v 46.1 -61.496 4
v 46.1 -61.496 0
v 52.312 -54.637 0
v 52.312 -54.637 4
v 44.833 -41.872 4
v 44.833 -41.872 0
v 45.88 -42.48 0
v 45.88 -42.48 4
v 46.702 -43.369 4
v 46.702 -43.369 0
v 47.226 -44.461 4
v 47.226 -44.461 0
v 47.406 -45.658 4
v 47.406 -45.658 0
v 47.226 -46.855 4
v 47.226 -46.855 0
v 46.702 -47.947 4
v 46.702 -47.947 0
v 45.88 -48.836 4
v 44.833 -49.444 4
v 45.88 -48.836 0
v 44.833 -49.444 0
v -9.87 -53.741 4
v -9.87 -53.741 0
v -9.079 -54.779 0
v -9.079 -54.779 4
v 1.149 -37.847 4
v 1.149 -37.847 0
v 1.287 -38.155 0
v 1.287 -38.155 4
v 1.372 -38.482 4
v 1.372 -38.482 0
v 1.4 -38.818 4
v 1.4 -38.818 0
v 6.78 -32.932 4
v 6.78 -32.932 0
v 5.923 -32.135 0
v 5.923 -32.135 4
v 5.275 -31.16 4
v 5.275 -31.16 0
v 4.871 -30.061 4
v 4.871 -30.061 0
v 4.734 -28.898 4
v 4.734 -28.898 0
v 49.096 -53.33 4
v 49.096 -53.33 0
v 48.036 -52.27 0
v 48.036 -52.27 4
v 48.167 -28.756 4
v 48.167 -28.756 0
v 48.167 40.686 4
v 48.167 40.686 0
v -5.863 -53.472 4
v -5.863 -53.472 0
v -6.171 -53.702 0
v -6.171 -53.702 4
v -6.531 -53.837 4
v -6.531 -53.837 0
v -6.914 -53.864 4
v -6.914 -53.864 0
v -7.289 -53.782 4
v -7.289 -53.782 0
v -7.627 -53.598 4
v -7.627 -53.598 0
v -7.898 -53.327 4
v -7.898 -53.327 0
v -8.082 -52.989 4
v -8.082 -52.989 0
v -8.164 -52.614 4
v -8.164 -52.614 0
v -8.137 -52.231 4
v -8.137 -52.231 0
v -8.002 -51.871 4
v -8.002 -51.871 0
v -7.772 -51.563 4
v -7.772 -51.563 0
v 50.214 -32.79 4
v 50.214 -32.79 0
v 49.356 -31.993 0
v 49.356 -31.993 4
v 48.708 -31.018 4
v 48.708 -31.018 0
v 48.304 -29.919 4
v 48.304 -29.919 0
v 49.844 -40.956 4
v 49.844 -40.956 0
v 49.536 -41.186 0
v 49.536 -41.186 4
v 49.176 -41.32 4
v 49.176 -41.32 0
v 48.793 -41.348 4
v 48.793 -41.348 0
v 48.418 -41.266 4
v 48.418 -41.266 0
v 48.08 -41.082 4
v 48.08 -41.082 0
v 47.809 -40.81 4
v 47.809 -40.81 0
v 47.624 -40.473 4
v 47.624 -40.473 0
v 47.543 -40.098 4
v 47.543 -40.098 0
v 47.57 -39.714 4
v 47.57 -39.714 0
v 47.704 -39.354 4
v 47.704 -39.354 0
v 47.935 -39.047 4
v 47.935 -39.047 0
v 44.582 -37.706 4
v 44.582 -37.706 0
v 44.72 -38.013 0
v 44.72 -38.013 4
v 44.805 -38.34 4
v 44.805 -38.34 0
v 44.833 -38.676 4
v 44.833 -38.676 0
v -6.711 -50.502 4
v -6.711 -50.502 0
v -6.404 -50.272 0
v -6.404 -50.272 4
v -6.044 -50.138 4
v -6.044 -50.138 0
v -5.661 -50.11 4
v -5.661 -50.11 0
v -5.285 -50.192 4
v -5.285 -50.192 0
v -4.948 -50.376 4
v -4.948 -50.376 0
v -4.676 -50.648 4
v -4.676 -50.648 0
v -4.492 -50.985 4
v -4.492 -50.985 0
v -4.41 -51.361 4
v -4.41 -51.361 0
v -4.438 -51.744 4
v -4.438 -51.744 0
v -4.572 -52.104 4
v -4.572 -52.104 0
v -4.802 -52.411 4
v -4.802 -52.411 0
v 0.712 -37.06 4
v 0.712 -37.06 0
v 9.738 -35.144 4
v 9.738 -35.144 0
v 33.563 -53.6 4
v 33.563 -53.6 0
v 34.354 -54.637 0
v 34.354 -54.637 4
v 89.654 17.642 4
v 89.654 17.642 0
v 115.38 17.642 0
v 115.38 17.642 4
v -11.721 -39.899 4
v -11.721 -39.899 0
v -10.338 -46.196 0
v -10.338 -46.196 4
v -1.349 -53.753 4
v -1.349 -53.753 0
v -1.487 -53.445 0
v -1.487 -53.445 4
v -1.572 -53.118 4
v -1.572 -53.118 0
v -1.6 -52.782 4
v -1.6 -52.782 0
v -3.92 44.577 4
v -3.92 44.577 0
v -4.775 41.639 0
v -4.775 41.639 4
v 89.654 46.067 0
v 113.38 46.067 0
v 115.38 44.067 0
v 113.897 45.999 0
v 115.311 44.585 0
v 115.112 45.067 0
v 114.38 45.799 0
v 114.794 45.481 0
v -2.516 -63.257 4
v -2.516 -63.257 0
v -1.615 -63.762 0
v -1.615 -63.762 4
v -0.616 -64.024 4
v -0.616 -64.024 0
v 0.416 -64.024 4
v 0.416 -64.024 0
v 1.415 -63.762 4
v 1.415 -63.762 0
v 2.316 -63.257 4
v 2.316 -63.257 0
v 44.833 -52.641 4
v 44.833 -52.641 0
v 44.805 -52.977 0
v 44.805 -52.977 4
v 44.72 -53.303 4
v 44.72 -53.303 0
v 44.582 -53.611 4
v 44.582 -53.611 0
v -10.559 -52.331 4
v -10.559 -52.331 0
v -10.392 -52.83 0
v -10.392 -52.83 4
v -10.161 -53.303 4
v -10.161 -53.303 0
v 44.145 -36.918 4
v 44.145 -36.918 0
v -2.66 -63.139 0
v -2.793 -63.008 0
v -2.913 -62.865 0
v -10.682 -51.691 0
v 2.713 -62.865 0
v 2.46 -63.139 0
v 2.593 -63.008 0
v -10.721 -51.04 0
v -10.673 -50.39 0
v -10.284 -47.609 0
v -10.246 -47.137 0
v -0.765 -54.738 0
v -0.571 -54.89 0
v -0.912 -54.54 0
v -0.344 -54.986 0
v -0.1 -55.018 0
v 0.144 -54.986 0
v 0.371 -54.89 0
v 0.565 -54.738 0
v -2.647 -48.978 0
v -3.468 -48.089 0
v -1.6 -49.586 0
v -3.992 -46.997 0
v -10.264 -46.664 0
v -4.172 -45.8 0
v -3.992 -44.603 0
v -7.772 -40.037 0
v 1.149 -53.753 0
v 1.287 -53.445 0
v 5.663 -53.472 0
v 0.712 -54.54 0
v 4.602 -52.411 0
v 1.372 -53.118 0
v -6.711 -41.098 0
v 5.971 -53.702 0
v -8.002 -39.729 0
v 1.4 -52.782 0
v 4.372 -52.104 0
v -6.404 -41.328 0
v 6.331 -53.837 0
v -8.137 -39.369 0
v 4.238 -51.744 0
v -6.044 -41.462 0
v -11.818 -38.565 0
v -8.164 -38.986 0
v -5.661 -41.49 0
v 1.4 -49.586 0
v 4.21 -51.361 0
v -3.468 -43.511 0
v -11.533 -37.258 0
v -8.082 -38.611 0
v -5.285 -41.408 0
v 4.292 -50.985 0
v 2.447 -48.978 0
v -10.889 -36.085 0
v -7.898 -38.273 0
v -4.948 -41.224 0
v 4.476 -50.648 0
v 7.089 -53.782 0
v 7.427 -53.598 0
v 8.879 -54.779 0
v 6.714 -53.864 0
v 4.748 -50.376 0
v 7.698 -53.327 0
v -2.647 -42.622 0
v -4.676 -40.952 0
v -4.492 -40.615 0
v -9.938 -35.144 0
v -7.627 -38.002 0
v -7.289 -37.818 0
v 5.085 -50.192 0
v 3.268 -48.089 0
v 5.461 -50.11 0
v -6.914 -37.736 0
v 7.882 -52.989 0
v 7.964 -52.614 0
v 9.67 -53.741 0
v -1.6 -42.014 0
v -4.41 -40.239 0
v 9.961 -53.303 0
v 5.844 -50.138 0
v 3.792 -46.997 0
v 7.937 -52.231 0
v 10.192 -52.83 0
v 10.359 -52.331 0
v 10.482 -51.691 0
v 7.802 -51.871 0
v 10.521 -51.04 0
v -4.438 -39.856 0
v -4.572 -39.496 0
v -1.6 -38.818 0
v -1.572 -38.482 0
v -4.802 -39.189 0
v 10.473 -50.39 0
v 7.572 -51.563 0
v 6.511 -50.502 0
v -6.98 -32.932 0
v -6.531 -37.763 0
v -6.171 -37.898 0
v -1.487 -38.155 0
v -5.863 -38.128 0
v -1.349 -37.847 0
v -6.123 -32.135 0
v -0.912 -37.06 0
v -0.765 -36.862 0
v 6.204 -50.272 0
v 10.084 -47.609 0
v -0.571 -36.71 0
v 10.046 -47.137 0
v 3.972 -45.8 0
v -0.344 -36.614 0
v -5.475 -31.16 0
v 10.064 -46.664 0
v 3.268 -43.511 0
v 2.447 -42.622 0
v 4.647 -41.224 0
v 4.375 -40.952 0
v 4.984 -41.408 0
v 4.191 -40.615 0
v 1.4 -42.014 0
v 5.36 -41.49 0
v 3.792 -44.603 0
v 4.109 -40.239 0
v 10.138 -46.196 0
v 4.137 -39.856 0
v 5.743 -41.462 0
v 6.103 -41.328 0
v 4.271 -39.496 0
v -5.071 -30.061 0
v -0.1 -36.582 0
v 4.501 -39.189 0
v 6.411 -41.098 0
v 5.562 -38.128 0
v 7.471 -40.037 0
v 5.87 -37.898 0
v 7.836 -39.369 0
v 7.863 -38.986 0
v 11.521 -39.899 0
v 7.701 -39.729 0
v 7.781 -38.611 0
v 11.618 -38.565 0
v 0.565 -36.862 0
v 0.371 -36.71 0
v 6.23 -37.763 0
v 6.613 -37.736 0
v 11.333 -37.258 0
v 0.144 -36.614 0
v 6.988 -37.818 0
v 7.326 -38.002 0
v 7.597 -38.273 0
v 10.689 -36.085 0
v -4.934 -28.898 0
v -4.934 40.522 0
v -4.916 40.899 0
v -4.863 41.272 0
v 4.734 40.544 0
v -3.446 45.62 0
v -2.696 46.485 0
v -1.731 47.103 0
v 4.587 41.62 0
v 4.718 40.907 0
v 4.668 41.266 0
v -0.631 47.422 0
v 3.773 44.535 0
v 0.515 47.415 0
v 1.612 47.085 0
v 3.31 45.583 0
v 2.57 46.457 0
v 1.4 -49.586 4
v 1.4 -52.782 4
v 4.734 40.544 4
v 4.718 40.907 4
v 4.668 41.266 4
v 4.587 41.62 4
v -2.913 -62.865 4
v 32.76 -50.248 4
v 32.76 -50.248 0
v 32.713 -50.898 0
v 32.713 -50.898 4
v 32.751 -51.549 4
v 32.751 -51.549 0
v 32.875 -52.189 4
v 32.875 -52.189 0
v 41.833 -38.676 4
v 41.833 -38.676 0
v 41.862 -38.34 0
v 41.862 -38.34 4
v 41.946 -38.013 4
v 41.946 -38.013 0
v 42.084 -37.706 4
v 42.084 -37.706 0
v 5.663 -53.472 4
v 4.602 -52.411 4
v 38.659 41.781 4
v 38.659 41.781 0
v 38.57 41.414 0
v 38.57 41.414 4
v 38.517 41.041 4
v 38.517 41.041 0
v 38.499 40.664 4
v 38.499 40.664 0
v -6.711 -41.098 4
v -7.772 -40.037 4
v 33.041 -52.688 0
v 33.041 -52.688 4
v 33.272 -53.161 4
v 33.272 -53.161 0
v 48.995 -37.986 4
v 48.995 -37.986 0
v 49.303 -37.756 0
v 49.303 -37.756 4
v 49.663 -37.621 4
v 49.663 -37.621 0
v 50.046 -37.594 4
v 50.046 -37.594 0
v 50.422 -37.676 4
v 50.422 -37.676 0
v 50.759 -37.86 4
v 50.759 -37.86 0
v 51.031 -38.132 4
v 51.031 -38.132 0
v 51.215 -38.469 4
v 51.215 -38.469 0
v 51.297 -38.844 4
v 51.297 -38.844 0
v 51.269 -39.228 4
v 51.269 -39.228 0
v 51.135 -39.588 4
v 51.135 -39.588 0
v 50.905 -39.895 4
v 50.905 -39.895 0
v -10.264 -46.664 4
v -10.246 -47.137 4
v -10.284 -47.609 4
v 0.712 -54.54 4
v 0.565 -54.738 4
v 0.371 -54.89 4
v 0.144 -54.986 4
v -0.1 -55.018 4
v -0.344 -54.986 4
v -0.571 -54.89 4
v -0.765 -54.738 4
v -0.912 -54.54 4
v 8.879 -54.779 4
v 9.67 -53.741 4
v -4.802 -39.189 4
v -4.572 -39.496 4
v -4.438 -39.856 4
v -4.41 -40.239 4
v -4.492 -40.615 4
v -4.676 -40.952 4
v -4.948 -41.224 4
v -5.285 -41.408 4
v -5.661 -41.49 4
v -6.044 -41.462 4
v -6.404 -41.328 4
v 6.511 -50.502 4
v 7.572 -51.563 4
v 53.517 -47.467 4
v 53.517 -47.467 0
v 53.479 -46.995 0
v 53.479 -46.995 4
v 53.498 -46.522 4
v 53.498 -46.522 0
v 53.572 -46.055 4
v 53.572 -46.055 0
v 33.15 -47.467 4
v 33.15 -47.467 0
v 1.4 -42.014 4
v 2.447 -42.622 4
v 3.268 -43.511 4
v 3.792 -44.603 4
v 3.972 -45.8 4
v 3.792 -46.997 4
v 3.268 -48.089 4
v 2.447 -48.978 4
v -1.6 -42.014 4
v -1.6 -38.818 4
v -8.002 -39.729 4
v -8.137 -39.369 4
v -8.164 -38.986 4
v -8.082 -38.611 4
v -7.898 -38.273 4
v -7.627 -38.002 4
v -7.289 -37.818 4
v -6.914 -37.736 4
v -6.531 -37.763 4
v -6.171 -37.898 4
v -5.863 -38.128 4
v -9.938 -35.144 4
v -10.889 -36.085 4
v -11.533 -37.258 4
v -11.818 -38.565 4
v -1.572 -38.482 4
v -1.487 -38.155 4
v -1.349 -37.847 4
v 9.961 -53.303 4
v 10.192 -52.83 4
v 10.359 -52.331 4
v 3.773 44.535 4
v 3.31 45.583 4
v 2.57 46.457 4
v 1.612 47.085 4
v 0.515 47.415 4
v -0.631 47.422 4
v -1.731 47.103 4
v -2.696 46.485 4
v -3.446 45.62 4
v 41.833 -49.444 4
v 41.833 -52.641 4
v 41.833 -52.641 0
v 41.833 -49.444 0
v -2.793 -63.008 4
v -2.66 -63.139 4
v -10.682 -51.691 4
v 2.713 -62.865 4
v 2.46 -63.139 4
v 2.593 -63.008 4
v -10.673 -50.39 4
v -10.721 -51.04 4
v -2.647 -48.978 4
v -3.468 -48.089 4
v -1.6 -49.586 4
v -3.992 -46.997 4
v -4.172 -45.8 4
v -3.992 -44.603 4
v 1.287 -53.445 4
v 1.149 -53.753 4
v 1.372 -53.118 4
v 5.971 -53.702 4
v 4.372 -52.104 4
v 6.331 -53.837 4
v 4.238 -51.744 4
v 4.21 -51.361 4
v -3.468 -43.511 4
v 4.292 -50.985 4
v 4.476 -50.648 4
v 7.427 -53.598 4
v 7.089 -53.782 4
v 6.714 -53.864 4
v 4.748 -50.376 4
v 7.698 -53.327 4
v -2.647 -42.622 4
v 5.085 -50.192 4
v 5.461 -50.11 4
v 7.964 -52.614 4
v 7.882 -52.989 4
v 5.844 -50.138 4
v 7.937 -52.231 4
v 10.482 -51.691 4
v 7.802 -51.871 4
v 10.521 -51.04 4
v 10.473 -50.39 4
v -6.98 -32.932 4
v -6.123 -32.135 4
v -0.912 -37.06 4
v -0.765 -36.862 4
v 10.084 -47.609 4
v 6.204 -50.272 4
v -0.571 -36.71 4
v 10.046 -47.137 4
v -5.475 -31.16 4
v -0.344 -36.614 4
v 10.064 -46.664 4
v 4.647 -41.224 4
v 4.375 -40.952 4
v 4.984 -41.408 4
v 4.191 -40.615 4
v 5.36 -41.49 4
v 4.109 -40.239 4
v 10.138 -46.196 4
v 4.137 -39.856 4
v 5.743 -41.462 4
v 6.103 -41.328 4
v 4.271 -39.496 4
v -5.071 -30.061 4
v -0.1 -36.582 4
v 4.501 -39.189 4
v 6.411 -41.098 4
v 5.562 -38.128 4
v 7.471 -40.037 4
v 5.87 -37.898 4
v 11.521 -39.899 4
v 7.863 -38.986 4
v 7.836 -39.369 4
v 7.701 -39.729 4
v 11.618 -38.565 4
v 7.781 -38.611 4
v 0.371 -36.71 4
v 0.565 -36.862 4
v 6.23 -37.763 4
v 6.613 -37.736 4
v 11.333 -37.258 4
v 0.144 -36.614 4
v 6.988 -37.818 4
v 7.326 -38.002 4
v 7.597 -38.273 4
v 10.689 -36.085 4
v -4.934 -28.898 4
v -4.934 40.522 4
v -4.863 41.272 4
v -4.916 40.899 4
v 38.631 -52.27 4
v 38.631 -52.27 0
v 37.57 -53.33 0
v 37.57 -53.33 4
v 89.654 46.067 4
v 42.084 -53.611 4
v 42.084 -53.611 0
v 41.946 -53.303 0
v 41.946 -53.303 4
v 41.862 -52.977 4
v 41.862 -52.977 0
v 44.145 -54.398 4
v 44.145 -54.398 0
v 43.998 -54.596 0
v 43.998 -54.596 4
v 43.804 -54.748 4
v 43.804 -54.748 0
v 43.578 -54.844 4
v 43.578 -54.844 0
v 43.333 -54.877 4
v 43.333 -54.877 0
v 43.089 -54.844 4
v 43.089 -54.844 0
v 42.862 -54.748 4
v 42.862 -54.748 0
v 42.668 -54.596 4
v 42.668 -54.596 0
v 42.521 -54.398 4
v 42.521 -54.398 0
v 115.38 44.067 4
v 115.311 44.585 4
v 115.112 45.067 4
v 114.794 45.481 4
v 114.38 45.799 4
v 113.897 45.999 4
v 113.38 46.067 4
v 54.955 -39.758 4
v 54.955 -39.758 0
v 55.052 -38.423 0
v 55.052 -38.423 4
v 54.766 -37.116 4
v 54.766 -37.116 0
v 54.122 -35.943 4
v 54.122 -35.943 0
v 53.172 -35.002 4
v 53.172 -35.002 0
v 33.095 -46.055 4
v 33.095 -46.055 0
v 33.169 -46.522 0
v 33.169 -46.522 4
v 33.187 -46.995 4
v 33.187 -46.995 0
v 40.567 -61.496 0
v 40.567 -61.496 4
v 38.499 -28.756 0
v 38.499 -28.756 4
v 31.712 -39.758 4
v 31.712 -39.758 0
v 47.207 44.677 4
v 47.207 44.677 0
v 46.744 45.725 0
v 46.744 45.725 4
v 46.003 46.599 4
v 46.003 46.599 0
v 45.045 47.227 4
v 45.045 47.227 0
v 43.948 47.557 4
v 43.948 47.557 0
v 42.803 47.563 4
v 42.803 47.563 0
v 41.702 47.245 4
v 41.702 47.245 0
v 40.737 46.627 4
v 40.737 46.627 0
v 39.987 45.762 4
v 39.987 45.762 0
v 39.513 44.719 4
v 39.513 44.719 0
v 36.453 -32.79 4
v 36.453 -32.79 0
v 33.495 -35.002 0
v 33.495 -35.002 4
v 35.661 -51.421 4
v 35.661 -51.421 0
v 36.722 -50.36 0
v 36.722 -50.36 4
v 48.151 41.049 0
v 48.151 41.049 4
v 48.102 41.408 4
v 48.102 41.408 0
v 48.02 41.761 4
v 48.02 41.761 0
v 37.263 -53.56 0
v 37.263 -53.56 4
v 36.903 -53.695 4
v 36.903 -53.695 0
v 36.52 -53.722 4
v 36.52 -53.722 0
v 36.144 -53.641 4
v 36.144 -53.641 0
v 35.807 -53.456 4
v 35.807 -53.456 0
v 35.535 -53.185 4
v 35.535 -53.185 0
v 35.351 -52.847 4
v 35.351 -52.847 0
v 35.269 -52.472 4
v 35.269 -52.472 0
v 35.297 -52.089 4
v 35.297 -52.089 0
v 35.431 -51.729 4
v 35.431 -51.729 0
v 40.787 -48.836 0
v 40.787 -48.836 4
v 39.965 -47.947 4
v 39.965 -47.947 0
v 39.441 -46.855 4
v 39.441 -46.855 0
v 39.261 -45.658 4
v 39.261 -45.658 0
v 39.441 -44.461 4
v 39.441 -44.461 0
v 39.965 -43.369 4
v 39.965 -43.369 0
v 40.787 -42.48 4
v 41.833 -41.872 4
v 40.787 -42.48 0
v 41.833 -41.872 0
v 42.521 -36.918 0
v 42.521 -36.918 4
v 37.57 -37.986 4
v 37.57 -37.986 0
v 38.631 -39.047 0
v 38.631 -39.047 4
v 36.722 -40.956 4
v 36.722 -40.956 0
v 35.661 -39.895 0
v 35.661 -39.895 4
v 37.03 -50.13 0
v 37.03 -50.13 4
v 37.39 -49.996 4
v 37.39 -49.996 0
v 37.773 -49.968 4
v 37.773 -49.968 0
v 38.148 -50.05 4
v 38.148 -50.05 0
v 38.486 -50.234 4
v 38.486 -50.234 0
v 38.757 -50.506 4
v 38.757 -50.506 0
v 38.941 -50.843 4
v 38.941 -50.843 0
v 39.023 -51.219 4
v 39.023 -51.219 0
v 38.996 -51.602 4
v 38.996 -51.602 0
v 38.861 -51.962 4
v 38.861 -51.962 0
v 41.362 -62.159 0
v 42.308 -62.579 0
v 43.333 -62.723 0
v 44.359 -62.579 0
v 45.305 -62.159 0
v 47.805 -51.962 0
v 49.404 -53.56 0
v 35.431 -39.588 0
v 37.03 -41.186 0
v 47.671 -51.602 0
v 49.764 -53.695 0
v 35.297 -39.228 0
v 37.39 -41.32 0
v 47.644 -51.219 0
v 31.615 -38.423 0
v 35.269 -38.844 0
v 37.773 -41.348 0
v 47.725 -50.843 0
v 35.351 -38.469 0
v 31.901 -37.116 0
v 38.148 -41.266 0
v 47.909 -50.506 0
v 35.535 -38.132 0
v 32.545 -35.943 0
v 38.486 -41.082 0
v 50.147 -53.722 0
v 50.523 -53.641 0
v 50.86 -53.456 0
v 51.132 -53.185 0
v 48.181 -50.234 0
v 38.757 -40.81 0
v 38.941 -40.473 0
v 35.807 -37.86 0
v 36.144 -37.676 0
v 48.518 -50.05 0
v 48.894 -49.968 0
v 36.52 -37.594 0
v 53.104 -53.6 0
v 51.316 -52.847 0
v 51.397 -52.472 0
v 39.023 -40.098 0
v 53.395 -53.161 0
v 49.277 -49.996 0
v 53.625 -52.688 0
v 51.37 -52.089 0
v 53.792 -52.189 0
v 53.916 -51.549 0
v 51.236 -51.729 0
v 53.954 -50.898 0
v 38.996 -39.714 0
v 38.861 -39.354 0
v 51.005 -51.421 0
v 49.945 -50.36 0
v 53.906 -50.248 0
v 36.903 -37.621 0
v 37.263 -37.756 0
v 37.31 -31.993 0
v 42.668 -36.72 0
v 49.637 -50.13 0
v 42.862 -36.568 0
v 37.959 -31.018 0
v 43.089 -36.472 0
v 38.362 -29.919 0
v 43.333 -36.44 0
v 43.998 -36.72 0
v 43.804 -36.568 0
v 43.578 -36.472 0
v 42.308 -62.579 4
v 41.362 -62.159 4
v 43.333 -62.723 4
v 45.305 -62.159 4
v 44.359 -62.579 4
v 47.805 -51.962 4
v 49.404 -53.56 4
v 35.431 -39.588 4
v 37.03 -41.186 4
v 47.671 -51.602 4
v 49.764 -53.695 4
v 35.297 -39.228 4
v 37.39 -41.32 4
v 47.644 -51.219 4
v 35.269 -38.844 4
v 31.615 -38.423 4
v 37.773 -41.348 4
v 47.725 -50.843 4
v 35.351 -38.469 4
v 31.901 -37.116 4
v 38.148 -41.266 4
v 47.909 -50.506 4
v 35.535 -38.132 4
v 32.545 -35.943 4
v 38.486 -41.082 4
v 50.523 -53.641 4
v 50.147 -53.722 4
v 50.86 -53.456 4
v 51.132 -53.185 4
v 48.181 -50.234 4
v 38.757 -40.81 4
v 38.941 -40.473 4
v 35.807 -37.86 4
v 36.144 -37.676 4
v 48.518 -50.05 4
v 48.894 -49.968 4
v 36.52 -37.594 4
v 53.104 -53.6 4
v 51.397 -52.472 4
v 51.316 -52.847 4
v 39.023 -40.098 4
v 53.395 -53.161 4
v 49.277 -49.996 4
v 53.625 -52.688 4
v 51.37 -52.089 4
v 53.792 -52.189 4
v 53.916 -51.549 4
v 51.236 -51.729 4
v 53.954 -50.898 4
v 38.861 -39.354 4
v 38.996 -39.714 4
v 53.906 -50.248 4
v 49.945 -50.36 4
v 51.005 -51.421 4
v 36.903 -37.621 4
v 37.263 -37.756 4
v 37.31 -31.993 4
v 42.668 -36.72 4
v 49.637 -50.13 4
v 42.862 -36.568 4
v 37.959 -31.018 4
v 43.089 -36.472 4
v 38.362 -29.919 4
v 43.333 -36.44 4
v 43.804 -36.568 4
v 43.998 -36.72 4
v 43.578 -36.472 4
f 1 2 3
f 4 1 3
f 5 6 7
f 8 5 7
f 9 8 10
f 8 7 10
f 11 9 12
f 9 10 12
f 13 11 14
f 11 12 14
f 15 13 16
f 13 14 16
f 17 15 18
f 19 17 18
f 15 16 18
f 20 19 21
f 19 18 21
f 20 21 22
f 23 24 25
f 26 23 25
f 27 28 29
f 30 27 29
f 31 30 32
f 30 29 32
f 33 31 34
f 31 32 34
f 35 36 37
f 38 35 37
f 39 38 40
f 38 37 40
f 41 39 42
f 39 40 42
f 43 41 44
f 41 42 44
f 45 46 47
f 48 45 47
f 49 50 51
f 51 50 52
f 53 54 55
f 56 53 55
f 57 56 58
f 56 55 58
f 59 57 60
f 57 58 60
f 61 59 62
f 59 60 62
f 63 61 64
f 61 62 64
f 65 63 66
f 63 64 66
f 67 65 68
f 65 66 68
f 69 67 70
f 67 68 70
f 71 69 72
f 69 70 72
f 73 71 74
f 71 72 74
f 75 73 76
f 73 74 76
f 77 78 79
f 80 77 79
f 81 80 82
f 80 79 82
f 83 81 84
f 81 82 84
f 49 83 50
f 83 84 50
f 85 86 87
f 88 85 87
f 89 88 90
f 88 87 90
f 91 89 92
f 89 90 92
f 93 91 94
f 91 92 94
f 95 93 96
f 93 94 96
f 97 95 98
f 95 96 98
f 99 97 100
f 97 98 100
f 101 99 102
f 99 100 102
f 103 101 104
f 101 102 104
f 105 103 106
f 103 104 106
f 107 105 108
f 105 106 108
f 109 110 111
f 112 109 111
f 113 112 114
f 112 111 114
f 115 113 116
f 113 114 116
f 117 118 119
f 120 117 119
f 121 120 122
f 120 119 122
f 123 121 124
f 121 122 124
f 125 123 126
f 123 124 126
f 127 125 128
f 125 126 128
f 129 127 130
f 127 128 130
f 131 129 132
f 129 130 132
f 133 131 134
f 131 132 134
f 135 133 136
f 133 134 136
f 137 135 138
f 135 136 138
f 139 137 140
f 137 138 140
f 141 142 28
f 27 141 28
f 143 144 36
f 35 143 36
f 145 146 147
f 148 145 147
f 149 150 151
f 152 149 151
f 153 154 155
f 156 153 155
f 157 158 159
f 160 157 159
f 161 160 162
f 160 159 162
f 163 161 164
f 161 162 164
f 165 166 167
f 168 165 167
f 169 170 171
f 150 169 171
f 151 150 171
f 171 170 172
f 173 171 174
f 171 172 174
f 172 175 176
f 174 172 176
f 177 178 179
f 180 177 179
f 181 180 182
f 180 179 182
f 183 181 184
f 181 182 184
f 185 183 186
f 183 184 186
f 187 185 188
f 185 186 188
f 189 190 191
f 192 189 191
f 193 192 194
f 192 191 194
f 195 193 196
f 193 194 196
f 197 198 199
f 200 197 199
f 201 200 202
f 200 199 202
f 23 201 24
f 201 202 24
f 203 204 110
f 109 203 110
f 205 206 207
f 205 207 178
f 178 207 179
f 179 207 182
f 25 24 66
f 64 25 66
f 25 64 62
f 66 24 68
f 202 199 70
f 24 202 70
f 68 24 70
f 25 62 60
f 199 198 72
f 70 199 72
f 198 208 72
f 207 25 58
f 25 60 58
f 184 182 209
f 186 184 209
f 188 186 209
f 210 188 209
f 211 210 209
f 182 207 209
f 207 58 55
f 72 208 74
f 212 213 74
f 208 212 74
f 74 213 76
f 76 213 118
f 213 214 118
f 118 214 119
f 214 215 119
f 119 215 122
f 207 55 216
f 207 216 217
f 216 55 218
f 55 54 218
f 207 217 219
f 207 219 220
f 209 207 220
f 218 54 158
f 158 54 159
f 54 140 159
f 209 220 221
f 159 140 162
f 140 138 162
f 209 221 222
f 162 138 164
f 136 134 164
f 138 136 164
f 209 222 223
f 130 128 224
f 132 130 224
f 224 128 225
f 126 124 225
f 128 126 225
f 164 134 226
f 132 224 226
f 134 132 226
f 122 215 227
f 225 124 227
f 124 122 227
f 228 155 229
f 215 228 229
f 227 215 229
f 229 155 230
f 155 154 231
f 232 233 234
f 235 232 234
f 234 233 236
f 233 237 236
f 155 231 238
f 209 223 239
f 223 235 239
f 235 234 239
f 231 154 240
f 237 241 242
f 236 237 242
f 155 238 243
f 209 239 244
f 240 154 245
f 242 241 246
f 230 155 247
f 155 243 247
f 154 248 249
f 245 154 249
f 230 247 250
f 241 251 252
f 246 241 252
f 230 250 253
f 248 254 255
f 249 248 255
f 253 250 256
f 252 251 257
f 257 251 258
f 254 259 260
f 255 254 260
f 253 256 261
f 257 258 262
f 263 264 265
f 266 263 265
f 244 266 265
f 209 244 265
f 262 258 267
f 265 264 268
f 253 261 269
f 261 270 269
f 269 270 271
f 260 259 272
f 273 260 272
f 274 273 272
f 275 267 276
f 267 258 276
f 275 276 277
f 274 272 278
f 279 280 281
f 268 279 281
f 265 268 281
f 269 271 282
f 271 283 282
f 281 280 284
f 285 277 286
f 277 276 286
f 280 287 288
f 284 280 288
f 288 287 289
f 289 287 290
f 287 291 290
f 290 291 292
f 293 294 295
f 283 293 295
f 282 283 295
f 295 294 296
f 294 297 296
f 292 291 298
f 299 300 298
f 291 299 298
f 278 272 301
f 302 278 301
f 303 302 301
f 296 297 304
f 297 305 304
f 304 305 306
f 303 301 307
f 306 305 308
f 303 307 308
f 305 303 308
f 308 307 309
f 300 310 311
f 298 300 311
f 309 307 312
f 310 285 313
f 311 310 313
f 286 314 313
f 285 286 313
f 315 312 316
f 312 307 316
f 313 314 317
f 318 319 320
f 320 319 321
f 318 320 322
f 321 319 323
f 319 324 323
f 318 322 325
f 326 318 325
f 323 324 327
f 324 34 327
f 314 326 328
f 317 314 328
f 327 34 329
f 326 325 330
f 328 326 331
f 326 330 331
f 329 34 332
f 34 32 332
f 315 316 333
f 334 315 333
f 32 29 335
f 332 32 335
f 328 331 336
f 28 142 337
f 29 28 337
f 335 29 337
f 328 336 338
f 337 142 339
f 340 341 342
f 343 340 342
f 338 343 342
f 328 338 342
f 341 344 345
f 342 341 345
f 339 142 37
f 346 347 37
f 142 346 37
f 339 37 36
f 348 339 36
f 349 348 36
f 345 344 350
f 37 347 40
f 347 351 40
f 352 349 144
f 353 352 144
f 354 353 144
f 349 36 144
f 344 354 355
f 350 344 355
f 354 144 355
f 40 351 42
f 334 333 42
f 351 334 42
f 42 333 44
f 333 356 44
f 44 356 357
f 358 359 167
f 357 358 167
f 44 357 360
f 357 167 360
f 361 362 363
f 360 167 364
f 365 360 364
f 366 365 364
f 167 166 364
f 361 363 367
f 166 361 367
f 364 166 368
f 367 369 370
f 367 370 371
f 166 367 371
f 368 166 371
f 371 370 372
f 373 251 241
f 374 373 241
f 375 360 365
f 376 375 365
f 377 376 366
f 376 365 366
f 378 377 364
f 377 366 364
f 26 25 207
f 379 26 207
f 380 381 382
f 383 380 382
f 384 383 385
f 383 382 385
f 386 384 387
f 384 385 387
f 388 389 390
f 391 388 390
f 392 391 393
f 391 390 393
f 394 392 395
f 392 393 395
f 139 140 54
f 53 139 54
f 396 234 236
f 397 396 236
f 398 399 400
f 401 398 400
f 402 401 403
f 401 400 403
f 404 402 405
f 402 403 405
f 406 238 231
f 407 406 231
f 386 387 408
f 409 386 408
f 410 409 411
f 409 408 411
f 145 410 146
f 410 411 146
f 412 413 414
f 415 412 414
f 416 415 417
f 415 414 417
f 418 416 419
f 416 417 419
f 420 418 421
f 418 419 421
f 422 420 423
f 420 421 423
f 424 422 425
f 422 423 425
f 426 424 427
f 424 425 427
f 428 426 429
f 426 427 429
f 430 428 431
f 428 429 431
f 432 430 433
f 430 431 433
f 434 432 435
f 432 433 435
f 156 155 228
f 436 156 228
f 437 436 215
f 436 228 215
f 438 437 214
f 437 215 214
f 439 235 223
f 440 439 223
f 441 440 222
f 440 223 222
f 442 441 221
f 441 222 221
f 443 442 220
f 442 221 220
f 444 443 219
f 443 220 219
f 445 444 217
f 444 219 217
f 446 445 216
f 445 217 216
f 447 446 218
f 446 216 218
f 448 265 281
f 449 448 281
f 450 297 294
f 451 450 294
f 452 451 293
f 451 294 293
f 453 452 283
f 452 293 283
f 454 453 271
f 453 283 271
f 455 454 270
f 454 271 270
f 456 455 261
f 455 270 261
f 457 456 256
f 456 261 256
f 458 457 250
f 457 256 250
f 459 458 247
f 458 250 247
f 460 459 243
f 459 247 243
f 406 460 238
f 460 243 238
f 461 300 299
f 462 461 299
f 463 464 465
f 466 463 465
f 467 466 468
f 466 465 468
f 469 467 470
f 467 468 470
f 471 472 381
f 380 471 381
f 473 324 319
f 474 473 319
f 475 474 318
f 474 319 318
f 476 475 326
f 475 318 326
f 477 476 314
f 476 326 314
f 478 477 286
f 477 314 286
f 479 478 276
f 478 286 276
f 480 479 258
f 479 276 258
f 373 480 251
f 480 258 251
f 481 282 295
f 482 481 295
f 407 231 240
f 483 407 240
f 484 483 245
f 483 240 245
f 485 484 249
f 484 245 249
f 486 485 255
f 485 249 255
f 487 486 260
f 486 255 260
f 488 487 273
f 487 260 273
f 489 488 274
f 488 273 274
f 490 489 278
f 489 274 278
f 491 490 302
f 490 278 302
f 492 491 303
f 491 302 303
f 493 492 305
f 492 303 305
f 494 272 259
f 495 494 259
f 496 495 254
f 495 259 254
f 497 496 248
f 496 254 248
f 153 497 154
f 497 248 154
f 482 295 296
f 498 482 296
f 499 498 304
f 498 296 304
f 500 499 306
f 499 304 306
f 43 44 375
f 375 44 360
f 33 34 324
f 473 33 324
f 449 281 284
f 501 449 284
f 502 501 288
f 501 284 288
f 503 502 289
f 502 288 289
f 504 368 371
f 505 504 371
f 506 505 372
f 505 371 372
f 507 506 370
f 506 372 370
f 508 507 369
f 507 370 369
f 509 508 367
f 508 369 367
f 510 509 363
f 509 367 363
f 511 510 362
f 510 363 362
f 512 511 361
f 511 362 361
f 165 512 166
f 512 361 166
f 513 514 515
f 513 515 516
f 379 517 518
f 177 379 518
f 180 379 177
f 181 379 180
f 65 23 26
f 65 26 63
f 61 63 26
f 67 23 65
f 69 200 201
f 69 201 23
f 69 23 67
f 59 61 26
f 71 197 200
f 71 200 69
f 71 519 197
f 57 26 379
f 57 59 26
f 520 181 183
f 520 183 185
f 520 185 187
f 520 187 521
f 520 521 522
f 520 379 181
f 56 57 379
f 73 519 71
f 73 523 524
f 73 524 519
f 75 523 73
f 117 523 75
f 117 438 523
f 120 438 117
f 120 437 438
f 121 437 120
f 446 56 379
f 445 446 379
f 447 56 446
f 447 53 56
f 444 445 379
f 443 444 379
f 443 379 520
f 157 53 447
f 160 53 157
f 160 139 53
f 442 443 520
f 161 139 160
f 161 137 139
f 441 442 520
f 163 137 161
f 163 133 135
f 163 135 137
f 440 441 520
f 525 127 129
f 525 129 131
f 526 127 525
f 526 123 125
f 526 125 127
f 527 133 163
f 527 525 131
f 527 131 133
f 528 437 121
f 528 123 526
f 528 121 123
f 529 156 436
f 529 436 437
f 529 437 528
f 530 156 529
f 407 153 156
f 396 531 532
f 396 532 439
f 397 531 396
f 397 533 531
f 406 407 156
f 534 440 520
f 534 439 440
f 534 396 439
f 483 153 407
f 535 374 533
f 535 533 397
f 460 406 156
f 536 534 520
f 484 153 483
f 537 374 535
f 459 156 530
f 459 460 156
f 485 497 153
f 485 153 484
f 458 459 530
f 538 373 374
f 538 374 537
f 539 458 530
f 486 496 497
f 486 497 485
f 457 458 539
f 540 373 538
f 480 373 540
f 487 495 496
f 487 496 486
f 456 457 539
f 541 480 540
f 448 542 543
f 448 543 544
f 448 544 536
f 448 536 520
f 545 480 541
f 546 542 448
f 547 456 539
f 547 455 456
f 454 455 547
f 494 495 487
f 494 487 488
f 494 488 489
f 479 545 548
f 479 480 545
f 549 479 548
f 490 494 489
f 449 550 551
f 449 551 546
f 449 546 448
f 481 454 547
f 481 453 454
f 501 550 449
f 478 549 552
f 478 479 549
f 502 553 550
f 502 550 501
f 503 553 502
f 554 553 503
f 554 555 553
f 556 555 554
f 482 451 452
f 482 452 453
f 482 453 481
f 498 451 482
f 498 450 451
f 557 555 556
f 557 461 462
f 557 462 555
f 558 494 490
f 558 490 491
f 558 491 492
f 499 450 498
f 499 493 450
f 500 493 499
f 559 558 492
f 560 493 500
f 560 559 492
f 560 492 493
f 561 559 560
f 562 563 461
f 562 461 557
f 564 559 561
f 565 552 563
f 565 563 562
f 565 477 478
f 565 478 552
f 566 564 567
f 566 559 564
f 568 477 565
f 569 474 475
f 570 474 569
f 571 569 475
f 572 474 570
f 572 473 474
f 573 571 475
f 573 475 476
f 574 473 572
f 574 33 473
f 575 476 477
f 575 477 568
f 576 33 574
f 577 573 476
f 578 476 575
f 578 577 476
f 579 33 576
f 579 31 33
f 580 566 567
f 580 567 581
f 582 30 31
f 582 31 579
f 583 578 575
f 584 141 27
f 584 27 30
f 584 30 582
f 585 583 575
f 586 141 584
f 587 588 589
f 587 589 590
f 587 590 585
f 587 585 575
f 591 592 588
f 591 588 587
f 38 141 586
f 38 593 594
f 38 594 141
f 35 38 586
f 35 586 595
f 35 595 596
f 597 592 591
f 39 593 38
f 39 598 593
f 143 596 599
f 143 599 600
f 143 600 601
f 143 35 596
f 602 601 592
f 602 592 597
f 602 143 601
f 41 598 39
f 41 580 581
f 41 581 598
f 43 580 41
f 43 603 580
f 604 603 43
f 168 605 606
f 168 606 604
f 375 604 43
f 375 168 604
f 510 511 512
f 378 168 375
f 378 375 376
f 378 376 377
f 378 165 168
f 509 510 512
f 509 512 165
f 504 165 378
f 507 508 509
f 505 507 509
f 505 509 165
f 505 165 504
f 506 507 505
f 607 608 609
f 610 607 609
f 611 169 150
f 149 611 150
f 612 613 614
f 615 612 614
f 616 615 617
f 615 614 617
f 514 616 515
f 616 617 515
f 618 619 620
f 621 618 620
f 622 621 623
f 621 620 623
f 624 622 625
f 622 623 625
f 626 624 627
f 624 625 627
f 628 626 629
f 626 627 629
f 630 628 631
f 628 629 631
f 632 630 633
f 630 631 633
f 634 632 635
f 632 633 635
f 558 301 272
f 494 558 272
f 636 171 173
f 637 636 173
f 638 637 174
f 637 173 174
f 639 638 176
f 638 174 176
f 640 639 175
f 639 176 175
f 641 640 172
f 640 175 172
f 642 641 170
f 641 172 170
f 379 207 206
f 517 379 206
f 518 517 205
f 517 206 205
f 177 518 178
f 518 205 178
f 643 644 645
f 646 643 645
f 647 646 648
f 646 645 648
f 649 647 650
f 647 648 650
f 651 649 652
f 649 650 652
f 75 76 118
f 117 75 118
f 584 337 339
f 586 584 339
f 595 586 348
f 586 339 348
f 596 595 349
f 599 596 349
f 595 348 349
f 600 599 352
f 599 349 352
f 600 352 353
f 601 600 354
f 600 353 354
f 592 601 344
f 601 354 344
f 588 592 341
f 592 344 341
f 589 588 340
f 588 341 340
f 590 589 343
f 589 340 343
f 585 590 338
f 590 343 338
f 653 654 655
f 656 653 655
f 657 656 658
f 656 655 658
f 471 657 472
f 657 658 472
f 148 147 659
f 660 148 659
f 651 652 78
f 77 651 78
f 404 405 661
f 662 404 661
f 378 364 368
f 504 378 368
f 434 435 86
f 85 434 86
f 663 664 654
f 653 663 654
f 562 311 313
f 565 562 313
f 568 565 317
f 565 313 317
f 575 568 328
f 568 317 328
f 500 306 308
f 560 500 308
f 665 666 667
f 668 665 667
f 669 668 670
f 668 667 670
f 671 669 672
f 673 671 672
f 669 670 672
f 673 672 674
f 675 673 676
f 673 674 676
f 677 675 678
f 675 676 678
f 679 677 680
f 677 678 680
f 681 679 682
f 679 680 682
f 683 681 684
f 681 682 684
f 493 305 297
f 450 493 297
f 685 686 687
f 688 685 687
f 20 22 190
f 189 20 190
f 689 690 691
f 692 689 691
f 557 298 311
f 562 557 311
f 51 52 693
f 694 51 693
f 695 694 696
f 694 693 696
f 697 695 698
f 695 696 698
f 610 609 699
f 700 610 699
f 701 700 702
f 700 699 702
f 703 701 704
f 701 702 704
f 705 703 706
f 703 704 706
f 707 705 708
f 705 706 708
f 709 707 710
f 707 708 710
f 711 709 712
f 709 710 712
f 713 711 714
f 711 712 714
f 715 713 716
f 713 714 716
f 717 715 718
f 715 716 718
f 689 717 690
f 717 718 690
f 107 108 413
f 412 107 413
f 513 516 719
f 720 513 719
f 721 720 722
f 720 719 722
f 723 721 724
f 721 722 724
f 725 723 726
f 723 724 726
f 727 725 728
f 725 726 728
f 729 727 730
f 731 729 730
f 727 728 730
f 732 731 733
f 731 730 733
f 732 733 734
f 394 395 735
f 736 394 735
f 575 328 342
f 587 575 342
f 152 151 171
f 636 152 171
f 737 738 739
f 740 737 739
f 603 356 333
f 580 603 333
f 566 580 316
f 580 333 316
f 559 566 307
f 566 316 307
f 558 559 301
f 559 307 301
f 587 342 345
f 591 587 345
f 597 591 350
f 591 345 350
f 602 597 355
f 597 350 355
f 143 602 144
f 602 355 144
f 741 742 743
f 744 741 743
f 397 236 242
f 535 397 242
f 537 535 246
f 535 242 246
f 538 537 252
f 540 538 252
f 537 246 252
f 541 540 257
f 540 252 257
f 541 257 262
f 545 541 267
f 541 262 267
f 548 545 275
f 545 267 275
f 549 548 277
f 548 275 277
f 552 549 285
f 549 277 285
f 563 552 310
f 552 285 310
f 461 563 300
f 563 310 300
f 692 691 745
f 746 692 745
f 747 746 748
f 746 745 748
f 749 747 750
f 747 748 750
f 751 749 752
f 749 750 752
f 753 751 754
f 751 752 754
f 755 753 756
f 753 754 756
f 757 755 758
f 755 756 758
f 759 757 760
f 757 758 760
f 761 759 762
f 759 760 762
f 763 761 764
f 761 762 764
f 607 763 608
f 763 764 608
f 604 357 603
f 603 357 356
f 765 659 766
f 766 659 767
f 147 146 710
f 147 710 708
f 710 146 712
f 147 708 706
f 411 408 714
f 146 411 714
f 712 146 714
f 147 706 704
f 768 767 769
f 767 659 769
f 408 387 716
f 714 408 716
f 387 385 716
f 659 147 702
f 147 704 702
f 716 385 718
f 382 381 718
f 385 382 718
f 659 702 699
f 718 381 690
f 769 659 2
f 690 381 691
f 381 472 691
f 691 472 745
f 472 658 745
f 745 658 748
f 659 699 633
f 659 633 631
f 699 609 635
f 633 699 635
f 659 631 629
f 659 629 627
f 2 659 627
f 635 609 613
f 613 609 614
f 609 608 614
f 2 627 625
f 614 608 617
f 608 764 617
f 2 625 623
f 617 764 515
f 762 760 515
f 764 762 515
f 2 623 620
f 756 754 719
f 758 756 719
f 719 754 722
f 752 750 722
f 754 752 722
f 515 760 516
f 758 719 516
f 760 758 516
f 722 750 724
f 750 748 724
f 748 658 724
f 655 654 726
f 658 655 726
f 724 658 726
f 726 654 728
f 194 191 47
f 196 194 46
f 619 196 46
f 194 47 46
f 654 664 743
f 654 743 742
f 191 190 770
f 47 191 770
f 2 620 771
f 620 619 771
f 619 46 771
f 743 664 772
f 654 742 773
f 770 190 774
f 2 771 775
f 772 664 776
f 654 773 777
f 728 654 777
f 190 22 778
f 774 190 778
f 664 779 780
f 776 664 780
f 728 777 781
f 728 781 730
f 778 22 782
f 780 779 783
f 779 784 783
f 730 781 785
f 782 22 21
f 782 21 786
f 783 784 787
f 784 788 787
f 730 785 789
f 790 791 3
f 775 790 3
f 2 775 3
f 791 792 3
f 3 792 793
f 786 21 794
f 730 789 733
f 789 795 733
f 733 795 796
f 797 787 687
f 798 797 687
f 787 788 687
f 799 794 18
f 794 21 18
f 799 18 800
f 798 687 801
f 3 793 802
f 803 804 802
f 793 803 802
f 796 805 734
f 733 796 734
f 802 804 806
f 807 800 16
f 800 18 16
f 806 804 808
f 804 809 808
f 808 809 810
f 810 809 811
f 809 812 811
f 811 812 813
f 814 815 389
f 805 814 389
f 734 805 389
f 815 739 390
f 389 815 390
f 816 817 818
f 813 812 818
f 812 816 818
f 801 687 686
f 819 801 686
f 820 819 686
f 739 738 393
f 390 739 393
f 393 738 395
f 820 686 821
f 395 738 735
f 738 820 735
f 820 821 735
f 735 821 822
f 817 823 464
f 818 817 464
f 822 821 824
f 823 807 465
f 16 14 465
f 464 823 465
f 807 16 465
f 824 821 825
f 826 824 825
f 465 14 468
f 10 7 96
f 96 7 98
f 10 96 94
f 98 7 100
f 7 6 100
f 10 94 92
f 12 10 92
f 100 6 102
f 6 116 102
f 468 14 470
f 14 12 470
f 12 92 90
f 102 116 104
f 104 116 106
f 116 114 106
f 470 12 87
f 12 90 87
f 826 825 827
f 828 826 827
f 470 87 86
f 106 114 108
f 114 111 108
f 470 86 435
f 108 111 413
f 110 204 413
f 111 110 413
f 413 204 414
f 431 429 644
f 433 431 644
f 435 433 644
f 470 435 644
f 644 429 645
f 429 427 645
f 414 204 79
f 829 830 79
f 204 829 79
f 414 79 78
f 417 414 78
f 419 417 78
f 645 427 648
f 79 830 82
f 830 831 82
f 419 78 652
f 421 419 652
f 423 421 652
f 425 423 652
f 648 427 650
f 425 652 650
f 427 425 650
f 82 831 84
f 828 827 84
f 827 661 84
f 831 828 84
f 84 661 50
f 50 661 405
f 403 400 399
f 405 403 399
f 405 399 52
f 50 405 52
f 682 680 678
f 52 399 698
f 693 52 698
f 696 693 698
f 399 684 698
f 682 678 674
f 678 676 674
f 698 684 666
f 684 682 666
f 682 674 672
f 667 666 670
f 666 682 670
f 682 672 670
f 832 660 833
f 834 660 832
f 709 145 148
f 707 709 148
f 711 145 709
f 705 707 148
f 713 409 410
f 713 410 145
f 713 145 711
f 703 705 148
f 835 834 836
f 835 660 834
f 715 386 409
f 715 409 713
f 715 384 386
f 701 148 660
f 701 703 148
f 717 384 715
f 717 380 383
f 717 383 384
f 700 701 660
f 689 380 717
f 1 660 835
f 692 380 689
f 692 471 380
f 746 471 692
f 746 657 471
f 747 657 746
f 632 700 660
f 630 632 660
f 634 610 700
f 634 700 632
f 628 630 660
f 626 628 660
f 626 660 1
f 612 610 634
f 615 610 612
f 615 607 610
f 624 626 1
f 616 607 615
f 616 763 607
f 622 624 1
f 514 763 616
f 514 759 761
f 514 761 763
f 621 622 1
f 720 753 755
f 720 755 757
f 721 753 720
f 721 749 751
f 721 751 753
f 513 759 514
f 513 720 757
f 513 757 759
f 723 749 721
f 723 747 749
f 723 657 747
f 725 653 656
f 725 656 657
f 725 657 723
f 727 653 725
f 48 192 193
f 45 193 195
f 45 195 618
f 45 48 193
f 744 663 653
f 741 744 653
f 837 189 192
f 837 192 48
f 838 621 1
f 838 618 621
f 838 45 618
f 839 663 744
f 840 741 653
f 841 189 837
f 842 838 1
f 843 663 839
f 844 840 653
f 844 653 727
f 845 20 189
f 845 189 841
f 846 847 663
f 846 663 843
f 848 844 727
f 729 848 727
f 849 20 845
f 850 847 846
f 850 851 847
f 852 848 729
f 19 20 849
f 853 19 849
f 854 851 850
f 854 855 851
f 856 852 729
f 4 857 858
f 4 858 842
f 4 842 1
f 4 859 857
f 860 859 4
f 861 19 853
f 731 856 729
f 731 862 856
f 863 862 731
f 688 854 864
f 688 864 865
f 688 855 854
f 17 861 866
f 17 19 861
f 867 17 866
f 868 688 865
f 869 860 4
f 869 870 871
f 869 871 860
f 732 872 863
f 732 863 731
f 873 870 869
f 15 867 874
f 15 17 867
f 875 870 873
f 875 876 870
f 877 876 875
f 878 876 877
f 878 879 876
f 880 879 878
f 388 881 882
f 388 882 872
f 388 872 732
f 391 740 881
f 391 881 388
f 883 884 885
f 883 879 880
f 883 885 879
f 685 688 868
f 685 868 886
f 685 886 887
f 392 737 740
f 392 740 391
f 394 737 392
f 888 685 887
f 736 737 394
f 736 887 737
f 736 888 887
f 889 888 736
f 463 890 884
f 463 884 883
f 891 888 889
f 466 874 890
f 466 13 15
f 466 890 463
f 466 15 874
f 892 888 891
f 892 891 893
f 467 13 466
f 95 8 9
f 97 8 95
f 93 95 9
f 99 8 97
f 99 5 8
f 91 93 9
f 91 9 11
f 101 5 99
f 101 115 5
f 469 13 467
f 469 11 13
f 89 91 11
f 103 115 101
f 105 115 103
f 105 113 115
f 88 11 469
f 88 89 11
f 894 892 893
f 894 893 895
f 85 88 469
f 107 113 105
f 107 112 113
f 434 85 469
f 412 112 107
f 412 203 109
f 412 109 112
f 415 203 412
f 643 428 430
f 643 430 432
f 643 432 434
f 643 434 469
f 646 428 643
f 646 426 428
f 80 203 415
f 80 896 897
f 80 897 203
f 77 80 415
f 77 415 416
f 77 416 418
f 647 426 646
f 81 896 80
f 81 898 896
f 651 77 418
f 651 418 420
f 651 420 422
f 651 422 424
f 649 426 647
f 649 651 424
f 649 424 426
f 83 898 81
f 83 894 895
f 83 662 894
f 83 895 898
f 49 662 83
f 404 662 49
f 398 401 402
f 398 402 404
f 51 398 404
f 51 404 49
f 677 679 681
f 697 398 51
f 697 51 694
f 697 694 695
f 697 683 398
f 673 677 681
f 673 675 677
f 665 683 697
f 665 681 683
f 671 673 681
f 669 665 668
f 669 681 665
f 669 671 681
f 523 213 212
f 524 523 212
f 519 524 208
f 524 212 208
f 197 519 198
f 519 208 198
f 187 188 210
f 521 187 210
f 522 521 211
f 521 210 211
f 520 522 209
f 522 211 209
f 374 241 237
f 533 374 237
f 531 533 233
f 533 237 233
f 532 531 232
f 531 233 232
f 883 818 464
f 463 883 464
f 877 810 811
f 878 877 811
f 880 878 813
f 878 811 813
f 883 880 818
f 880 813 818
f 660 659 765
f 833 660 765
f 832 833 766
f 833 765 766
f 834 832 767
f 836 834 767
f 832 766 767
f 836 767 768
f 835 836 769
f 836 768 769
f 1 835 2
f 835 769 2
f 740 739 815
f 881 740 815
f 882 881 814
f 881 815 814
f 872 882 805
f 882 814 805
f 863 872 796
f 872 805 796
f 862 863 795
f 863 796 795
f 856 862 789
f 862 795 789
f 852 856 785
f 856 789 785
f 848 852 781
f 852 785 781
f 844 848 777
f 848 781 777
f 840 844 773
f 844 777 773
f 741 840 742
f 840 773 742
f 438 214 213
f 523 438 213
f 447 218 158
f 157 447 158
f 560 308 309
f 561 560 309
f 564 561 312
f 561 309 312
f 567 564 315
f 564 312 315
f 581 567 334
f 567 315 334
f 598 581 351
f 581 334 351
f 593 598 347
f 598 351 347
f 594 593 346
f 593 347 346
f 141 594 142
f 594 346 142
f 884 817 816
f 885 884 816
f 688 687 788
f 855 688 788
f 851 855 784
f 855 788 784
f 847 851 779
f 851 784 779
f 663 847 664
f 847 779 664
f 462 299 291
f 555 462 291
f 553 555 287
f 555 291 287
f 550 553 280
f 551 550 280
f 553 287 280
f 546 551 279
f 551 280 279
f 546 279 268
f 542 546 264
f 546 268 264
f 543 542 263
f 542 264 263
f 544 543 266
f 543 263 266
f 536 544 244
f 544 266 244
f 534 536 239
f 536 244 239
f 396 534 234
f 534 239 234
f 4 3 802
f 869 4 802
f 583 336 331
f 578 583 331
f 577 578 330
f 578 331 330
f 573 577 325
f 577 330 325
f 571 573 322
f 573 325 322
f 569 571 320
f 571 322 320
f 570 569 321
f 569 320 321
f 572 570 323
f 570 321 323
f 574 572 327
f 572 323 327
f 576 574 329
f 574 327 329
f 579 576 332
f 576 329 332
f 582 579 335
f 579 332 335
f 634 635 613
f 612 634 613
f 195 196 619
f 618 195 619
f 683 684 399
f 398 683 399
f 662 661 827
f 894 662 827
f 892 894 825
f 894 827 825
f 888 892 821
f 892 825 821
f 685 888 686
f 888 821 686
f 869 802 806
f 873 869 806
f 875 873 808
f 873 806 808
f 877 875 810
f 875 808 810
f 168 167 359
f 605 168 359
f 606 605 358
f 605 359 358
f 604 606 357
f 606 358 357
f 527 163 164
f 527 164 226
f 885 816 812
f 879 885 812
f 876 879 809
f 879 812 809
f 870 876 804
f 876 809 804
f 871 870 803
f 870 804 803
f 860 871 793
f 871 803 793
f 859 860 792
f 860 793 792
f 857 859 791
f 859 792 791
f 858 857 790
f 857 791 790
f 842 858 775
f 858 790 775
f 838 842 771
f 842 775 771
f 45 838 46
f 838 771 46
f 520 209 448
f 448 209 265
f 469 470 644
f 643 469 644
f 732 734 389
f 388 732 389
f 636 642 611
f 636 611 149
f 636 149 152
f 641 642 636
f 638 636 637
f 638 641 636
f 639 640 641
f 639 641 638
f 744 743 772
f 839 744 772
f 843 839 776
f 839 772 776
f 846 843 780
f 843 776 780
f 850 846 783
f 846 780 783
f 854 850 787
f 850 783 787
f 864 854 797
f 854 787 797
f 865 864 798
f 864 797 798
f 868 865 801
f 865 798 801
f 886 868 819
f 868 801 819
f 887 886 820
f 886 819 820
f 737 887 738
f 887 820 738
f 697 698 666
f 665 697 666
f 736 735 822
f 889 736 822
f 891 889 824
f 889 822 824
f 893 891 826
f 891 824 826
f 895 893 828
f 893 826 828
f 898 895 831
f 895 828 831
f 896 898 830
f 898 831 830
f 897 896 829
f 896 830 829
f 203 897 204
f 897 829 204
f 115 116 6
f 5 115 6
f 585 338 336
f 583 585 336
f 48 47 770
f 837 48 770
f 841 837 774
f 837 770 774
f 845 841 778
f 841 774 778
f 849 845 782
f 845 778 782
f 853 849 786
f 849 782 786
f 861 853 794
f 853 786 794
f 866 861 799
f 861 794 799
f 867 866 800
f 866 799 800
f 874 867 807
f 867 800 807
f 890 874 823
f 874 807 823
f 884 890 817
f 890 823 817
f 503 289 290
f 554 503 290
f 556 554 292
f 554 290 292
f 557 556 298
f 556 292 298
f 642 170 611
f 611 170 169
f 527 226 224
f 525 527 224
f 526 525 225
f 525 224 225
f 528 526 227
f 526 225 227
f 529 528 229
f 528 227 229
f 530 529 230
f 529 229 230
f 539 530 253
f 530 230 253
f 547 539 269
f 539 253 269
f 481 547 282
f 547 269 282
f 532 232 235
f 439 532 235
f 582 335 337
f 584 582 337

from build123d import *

# Parameters (mm, degrees)
F1_DEPTH = 4


with BuildPart() as f1:
    # F0 (on Top) → F1 (new body)
    with BuildSketch(Plane.XY):
        with BuildLine():
            ThreePointArc((-10.558655, -52.331149), (-10.284312, -53.070409), (-9.870278, -53.741488))
            Line((-9.870278, -53.741488), (-9.079032, -54.779026))
            Line((-9.079032, -54.779026), (-2.866229, -61.63786))
            ThreePointArc((-2.866229, -61.63786), (-0.099999, -62.864533), (2.666231, -61.63786))
            Line((2.666231, -61.63786), (8.879034, -54.779026))
            Line((8.879034, -54.779026), (9.67028, -53.741488))
            ThreePointArc((9.67028, -53.741488), (10.084314, -53.070409), (10.358657, -52.331149))
            ThreePointArc((10.358657, -52.331149), (10.512135, -51.366067), (10.472941, -50.389644))
            Line((10.472941, -50.389644), (10.083805, -47.608834))
            ThreePointArc((10.083805, -47.608834), (10.048183, -46.900192), (10.138329, -46.196405))
            Line((10.138329, -46.196405), (11.521367, -39.899416))
            ThreePointArc((11.521367, -39.899416), (11.332862, -37.257928), (9.738374, -35.143549))
            Line((9.738374, -35.143549), (6.780304, -32.932375))
            ThreePointArc((6.780304, -32.932375), (5.274798, -31.15986), (4.733962, -28.898034))
            Line((4.733962, -28.898034), (4.733962, -28.158009))
            Line((4.733962, -28.158009), (4.733962, -23.90792))
            Line((4.733962, -23.90792), (4.733962, 40.544426))
            ThreePointArc((4.733962, 40.544426), (4.69699, 41.087018), (4.586758, 41.61958))
            Line((4.586758, 41.61958), (3.773216, 44.534895))
            ThreePointArc((3.773216, 44.534895), (-0.057773, 47.459681), (-3.920425, 44.576841))
            Line((-3.920425, 44.576841), (-4.774804, 41.639293))
            ThreePointArc((-4.774804, 41.639293), (-4.893971, 41.086383), (-4.93396, 40.522192))
            Line((-4.93396, 40.522192), (-4.93396, -23.90792))
            Line((-4.93396, -23.90792), (-4.93396, -28.158009))
            Line((-4.93396, -28.158009), (-4.93396, -28.898034))
            ThreePointArc((-4.93396, -28.898034), (-5.474796, -31.15986), (-6.980302, -32.932375))
            Line((-6.980302, -32.932375), (-9.938372, -35.143549))
            ThreePointArc((-9.938372, -35.143549), (-11.53286, -37.257928), (-11.721365, -39.899416))
            Line((-11.721365, -39.899416), (-10.338327, -46.196405))
            ThreePointArc((-10.338327, -46.196405), (-10.248182, -46.900192), (-10.283803, -47.608834))
            Line((-10.283803, -47.608834), (-10.672939, -50.389644))
            ThreePointArc((-10.672939, -50.389644), (-10.712133, -51.366067), (-10.558655, -52.331149))
        make_face()
        with BuildLine():
            ThreePointArc((-6.711447, -50.502253), (-4.802259, -50.502253), (-4.802259, -52.411441))
            Line((-4.802259, -52.411441), (-5.862919, -53.472102))
            ThreePointArc((-5.862919, -53.472102), (-7.772108, -53.472102), (-7.772108, -51.562913))
            Line((-7.772108, -51.562913), (-6.711447, -50.502253))
        make_face(mode=Mode.SUBTRACT)
        with BuildLine():
            Line((5.662921, -53.472102), (4.602261, -52.411441))
            ThreePointArc((4.602261, -52.411441), (4.602261, -50.502253), (6.511449, -50.502253))
            Line((6.511449, -50.502253), (7.57211, -51.562913))
            ThreePointArc((7.57211, -51.562913), (7.57211, -53.472102), (5.662921, -53.472102))
        make_face(mode=Mode.SUBTRACT)
        with BuildLine():
            Line((1.400001, -49.586116), (1.400001, -52.782411))
            ThreePointArc((1.400001, -52.782411), (1.336215, -53.283486), (1.148925, -53.752599))
            Line((1.148925, -53.752599), (0.711944, -54.540329))
            ThreePointArc((0.711944, -54.540329), (-0.099999, -55.018422), (-0.911942, -54.540329))
            Line((-0.911942, -54.540329), (-1.348923, -53.752599))
            ThreePointArc((-1.348923, -53.752599), (-1.536213, -53.283486), (-1.599999, -52.782411))
            Line((-1.599999, -52.782411), (-1.599999, -49.586116))
            ThreePointArc((-1.599999, -49.586116), (-4.172434, -45.799993), (-1.599999, -42.01387))
            Line((-1.599999, -42.01387), (-1.599999, -38.817575))
            ThreePointArc((-1.599999, -38.817575), (-1.536213, -38.3165), (-1.348923, -37.847387))
            Line((-1.348923, -37.847387), (-0.911942, -37.059657))
            ThreePointArc((-0.911942, -37.059657), (-0.099999, -36.581564), (0.711944, -37.059657))
            Line((0.711944, -37.059657), (1.148925, -37.847387))
            ThreePointArc((1.148925, -37.847387), (1.336215, -38.3165), (1.400001, -38.817575))
            Line((1.400001, -38.817575), (1.400001, -42.01387))
            ThreePointArc((1.400001, -42.01387), (3.972436, -45.799993), (1.400001, -49.586116))
        make_face(mode=Mode.SUBTRACT)
        with BuildLine():
            ThreePointArc((-4.802259, -39.188545), (-4.802259, -41.097733), (-6.711447, -41.097733))
            Line((-6.711447, -41.097733), (-7.772108, -40.037073))
            ThreePointArc((-7.772108, -40.037073), (-7.772108, -38.127885), (-5.862919, -38.127885))
            Line((-5.862919, -38.127885), (-4.802259, -39.188545))
        make_face(mode=Mode.SUBTRACT)
        with BuildLine():
            Line((7.471188, -40.037073), (6.410528, -41.097733))
            ThreePointArc((6.410528, -41.097733), (4.50134, -41.097733), (4.50134, -39.188545))
            Line((4.50134, -39.188545), (5.562, -38.127885))
            ThreePointArc((5.562, -38.127885), (7.471188, -38.127885), (7.471188, -40.037073))
        make_face(mode=Mode.SUBTRACT)
        with BuildLine():
            Line((-2.866229, -61.63786), (-9.079032, -54.779026))
            Line((-9.079032, -54.779026), (-2.912687, -62.864774))
            ThreePointArc((-2.912687, -62.864774), (-2.727914, -63.074801), (-2.515644, -63.256993))
            ThreePointArc((-2.515644, -63.256993), (-0.099999, -64.056578), (2.315646, -63.256993))
            ThreePointArc((2.315646, -63.256993), (2.527916, -63.074801), (2.712689, -62.864774))
            Line((2.712689, -62.864774), (8.879034, -54.779026))
            Line((8.879034, -54.779026), (2.666231, -61.63786))
            ThreePointArc((2.666231, -61.63786), (-0.099999, -62.864533), (-2.866229, -61.63786))
        make_face()
        with BuildLine():
            ThreePointArc((32.874717, -52.189267), (33.14906, -52.928528), (33.563094, -53.599606))
            Line((33.563094, -53.599606), (34.35434, -54.637144))
            Line((34.35434, -54.637144), (40.567143, -61.495978))
            ThreePointArc((40.567143, -61.495978), (43.333373, -62.722652), (46.099603, -61.495978))
            Line((46.099603, -61.495978), (52.312406, -54.637144))
            Line((52.312406, -54.637144), (53.103652, -53.599606))
            ThreePointArc((53.103652, -53.599606), (53.517686, -52.928528), (53.792029, -52.189267))
            ThreePointArc((53.792029, -52.189267), (53.945507, -51.224186), (53.906313, -50.247763))
            Line((53.906313, -50.247763), (53.517177, -47.466953))
            ThreePointArc((53.517177, -47.466953), (53.481555, -46.75831), (53.571701, -46.054523))
            Line((53.571701, -46.054523), (54.954739, -39.757535))
            ThreePointArc((54.954739, -39.757535), (54.766234, -37.116047), (53.171745, -35.001667))
            Line((53.171745, -35.001667), (50.213676, -32.790494))
            ThreePointArc((50.213676, -32.790494), (48.70817, -31.017979), (48.167334, -28.756153))
            Line((48.167334, -28.756153), (48.167334, -28.016128))
            Line((48.167334, -28.016128), (48.167334, -23.766038))
            Line((48.167334, -23.766038), (48.167334, 40.686308))
            ThreePointArc((48.167334, 40.686308), (48.130362, 41.2289), (48.02013, 41.761462))
            Line((48.02013, 41.761462), (47.206588, 44.676777))
            ThreePointArc((47.206588, 44.676777), (43.375599, 47.601563), (39.512947, 44.718723))
            Line((39.512947, 44.718723), (38.658568, 41.781174))
            ThreePointArc((38.658568, 41.781174), (38.539401, 41.228265), (38.499412, 40.664074))
            Line((38.499412, 40.664074), (38.499412, -23.766038))
            Line((38.499412, -23.766038), (38.499412, -28.016128))
            Line((38.499412, -28.016128), (38.499412, -28.756153))
            ThreePointArc((38.499412, -28.756153), (37.958576, -31.017979), (36.45307, -32.790494))
            Line((36.45307, -32.790494), (33.495, -35.001667))
            ThreePointArc((33.495, -35.001667), (31.900512, -37.116047), (31.712007, -39.757535))
            Line((31.712007, -39.757535), (33.095045, -46.054523))
            ThreePointArc((33.095045, -46.054523), (33.18519, -46.75831), (33.149569, -47.466953))
            Line((33.149569, -47.466953), (32.760433, -50.247763))
            ThreePointArc((32.760433, -50.247763), (32.721239, -51.224186), (32.874717, -52.189267))
        make_face()
        with BuildLine():
            ThreePointArc((36.721925, -50.360372), (38.631113, -50.360372), (38.631113, -52.26956))
            Line((38.631113, -52.26956), (37.570453, -53.33022))
            ThreePointArc((37.570453, -53.33022), (35.661264, -53.33022), (35.661264, -51.421032))
            Line((35.661264, -51.421032), (36.721925, -50.360372))
        make_face(mode=Mode.SUBTRACT)
        with BuildLine():
            Line((49.096293, -53.33022), (48.035633, -52.26956))
            ThreePointArc((48.035633, -52.26956), (48.035633, -50.360372), (49.944821, -50.360372))
            Line((49.944821, -50.360372), (51.005481, -51.421032))
            ThreePointArc((51.005481, -51.421032), (51.005481, -53.33022), (49.096293, -53.33022))
        make_face(mode=Mode.SUBTRACT)
        with BuildLine():
            Line((44.833373, -49.444235), (44.833373, -52.640529))
            ThreePointArc((44.833373, -52.640529), (44.769587, -53.141604), (44.582297, -53.610718))
            Line((44.582297, -53.610718), (44.145316, -54.398447))
            ThreePointArc((44.145316, -54.398447), (43.333373, -54.87654), (42.52143, -54.398447))
            Line((42.52143, -54.398447), (42.084449, -53.610718))
            ThreePointArc((42.084449, -53.610718), (41.897159, -53.141604), (41.833373, -52.640529))
            Line((41.833373, -52.640529), (41.833373, -49.444235))
            ThreePointArc((41.833373, -49.444235), (39.260938, -45.658112), (41.833373, -41.871988))
            Line((41.833373, -41.871988), (41.833373, -38.675694))
            ThreePointArc((41.833373, -38.675694), (41.897159, -38.174619), (42.084449, -37.705506))
            Line((42.084449, -37.705506), (42.52143, -36.917776))
            ThreePointArc((42.52143, -36.917776), (43.333373, -36.439683), (44.145316, -36.917776))
            Line((44.145316, -36.917776), (44.582297, -37.705506))
            ThreePointArc((44.582297, -37.705506), (44.769587, -38.174619), (44.833373, -38.675694))
            Line((44.833373, -38.675694), (44.833373, -41.871988))
            ThreePointArc((44.833373, -41.871988), (47.405808, -45.658112), (44.833373, -49.444235))
        make_face(mode=Mode.SUBTRACT)
        with BuildLine():
            ThreePointArc((38.631113, -39.046663), (38.631113, -40.955851), (36.721925, -40.955851))
            Line((36.721925, -40.955851), (35.661264, -39.895191))
            ThreePointArc((35.661264, -39.895191), (35.661264, -37.986003), (37.570453, -37.986003))
            Line((37.570453, -37.986003), (38.631113, -39.046663))
        make_face(mode=Mode.SUBTRACT)
        with BuildLine():
            Line((50.90456, -39.895191), (49.8439, -40.955851))
            ThreePointArc((49.8439, -40.955851), (47.934712, -40.955851), (47.934712, -39.046663))
            Line((47.934712, -39.046663), (48.995372, -37.986003))
            ThreePointArc((48.995372, -37.986003), (50.90456, -37.986003), (50.90456, -39.895191))
        make_face(mode=Mode.SUBTRACT)
        with BuildLine():
            Line((113.379507, 46.067093), (89.653552, 46.067093))
            Line((89.653552, 46.067093), (89.653552, 17.641801))
            Line((89.653552, 17.641801), (115.379507, 17.641801))
            Line((115.379507, 17.641801), (115.379507, 44.067093))
            ThreePointArc((115.379507, 44.067093), (114.79372, 45.481306), (113.379507, 46.067093))
        make_face()
    extrude(amount=F1_DEPTH)


solid = f1.part
